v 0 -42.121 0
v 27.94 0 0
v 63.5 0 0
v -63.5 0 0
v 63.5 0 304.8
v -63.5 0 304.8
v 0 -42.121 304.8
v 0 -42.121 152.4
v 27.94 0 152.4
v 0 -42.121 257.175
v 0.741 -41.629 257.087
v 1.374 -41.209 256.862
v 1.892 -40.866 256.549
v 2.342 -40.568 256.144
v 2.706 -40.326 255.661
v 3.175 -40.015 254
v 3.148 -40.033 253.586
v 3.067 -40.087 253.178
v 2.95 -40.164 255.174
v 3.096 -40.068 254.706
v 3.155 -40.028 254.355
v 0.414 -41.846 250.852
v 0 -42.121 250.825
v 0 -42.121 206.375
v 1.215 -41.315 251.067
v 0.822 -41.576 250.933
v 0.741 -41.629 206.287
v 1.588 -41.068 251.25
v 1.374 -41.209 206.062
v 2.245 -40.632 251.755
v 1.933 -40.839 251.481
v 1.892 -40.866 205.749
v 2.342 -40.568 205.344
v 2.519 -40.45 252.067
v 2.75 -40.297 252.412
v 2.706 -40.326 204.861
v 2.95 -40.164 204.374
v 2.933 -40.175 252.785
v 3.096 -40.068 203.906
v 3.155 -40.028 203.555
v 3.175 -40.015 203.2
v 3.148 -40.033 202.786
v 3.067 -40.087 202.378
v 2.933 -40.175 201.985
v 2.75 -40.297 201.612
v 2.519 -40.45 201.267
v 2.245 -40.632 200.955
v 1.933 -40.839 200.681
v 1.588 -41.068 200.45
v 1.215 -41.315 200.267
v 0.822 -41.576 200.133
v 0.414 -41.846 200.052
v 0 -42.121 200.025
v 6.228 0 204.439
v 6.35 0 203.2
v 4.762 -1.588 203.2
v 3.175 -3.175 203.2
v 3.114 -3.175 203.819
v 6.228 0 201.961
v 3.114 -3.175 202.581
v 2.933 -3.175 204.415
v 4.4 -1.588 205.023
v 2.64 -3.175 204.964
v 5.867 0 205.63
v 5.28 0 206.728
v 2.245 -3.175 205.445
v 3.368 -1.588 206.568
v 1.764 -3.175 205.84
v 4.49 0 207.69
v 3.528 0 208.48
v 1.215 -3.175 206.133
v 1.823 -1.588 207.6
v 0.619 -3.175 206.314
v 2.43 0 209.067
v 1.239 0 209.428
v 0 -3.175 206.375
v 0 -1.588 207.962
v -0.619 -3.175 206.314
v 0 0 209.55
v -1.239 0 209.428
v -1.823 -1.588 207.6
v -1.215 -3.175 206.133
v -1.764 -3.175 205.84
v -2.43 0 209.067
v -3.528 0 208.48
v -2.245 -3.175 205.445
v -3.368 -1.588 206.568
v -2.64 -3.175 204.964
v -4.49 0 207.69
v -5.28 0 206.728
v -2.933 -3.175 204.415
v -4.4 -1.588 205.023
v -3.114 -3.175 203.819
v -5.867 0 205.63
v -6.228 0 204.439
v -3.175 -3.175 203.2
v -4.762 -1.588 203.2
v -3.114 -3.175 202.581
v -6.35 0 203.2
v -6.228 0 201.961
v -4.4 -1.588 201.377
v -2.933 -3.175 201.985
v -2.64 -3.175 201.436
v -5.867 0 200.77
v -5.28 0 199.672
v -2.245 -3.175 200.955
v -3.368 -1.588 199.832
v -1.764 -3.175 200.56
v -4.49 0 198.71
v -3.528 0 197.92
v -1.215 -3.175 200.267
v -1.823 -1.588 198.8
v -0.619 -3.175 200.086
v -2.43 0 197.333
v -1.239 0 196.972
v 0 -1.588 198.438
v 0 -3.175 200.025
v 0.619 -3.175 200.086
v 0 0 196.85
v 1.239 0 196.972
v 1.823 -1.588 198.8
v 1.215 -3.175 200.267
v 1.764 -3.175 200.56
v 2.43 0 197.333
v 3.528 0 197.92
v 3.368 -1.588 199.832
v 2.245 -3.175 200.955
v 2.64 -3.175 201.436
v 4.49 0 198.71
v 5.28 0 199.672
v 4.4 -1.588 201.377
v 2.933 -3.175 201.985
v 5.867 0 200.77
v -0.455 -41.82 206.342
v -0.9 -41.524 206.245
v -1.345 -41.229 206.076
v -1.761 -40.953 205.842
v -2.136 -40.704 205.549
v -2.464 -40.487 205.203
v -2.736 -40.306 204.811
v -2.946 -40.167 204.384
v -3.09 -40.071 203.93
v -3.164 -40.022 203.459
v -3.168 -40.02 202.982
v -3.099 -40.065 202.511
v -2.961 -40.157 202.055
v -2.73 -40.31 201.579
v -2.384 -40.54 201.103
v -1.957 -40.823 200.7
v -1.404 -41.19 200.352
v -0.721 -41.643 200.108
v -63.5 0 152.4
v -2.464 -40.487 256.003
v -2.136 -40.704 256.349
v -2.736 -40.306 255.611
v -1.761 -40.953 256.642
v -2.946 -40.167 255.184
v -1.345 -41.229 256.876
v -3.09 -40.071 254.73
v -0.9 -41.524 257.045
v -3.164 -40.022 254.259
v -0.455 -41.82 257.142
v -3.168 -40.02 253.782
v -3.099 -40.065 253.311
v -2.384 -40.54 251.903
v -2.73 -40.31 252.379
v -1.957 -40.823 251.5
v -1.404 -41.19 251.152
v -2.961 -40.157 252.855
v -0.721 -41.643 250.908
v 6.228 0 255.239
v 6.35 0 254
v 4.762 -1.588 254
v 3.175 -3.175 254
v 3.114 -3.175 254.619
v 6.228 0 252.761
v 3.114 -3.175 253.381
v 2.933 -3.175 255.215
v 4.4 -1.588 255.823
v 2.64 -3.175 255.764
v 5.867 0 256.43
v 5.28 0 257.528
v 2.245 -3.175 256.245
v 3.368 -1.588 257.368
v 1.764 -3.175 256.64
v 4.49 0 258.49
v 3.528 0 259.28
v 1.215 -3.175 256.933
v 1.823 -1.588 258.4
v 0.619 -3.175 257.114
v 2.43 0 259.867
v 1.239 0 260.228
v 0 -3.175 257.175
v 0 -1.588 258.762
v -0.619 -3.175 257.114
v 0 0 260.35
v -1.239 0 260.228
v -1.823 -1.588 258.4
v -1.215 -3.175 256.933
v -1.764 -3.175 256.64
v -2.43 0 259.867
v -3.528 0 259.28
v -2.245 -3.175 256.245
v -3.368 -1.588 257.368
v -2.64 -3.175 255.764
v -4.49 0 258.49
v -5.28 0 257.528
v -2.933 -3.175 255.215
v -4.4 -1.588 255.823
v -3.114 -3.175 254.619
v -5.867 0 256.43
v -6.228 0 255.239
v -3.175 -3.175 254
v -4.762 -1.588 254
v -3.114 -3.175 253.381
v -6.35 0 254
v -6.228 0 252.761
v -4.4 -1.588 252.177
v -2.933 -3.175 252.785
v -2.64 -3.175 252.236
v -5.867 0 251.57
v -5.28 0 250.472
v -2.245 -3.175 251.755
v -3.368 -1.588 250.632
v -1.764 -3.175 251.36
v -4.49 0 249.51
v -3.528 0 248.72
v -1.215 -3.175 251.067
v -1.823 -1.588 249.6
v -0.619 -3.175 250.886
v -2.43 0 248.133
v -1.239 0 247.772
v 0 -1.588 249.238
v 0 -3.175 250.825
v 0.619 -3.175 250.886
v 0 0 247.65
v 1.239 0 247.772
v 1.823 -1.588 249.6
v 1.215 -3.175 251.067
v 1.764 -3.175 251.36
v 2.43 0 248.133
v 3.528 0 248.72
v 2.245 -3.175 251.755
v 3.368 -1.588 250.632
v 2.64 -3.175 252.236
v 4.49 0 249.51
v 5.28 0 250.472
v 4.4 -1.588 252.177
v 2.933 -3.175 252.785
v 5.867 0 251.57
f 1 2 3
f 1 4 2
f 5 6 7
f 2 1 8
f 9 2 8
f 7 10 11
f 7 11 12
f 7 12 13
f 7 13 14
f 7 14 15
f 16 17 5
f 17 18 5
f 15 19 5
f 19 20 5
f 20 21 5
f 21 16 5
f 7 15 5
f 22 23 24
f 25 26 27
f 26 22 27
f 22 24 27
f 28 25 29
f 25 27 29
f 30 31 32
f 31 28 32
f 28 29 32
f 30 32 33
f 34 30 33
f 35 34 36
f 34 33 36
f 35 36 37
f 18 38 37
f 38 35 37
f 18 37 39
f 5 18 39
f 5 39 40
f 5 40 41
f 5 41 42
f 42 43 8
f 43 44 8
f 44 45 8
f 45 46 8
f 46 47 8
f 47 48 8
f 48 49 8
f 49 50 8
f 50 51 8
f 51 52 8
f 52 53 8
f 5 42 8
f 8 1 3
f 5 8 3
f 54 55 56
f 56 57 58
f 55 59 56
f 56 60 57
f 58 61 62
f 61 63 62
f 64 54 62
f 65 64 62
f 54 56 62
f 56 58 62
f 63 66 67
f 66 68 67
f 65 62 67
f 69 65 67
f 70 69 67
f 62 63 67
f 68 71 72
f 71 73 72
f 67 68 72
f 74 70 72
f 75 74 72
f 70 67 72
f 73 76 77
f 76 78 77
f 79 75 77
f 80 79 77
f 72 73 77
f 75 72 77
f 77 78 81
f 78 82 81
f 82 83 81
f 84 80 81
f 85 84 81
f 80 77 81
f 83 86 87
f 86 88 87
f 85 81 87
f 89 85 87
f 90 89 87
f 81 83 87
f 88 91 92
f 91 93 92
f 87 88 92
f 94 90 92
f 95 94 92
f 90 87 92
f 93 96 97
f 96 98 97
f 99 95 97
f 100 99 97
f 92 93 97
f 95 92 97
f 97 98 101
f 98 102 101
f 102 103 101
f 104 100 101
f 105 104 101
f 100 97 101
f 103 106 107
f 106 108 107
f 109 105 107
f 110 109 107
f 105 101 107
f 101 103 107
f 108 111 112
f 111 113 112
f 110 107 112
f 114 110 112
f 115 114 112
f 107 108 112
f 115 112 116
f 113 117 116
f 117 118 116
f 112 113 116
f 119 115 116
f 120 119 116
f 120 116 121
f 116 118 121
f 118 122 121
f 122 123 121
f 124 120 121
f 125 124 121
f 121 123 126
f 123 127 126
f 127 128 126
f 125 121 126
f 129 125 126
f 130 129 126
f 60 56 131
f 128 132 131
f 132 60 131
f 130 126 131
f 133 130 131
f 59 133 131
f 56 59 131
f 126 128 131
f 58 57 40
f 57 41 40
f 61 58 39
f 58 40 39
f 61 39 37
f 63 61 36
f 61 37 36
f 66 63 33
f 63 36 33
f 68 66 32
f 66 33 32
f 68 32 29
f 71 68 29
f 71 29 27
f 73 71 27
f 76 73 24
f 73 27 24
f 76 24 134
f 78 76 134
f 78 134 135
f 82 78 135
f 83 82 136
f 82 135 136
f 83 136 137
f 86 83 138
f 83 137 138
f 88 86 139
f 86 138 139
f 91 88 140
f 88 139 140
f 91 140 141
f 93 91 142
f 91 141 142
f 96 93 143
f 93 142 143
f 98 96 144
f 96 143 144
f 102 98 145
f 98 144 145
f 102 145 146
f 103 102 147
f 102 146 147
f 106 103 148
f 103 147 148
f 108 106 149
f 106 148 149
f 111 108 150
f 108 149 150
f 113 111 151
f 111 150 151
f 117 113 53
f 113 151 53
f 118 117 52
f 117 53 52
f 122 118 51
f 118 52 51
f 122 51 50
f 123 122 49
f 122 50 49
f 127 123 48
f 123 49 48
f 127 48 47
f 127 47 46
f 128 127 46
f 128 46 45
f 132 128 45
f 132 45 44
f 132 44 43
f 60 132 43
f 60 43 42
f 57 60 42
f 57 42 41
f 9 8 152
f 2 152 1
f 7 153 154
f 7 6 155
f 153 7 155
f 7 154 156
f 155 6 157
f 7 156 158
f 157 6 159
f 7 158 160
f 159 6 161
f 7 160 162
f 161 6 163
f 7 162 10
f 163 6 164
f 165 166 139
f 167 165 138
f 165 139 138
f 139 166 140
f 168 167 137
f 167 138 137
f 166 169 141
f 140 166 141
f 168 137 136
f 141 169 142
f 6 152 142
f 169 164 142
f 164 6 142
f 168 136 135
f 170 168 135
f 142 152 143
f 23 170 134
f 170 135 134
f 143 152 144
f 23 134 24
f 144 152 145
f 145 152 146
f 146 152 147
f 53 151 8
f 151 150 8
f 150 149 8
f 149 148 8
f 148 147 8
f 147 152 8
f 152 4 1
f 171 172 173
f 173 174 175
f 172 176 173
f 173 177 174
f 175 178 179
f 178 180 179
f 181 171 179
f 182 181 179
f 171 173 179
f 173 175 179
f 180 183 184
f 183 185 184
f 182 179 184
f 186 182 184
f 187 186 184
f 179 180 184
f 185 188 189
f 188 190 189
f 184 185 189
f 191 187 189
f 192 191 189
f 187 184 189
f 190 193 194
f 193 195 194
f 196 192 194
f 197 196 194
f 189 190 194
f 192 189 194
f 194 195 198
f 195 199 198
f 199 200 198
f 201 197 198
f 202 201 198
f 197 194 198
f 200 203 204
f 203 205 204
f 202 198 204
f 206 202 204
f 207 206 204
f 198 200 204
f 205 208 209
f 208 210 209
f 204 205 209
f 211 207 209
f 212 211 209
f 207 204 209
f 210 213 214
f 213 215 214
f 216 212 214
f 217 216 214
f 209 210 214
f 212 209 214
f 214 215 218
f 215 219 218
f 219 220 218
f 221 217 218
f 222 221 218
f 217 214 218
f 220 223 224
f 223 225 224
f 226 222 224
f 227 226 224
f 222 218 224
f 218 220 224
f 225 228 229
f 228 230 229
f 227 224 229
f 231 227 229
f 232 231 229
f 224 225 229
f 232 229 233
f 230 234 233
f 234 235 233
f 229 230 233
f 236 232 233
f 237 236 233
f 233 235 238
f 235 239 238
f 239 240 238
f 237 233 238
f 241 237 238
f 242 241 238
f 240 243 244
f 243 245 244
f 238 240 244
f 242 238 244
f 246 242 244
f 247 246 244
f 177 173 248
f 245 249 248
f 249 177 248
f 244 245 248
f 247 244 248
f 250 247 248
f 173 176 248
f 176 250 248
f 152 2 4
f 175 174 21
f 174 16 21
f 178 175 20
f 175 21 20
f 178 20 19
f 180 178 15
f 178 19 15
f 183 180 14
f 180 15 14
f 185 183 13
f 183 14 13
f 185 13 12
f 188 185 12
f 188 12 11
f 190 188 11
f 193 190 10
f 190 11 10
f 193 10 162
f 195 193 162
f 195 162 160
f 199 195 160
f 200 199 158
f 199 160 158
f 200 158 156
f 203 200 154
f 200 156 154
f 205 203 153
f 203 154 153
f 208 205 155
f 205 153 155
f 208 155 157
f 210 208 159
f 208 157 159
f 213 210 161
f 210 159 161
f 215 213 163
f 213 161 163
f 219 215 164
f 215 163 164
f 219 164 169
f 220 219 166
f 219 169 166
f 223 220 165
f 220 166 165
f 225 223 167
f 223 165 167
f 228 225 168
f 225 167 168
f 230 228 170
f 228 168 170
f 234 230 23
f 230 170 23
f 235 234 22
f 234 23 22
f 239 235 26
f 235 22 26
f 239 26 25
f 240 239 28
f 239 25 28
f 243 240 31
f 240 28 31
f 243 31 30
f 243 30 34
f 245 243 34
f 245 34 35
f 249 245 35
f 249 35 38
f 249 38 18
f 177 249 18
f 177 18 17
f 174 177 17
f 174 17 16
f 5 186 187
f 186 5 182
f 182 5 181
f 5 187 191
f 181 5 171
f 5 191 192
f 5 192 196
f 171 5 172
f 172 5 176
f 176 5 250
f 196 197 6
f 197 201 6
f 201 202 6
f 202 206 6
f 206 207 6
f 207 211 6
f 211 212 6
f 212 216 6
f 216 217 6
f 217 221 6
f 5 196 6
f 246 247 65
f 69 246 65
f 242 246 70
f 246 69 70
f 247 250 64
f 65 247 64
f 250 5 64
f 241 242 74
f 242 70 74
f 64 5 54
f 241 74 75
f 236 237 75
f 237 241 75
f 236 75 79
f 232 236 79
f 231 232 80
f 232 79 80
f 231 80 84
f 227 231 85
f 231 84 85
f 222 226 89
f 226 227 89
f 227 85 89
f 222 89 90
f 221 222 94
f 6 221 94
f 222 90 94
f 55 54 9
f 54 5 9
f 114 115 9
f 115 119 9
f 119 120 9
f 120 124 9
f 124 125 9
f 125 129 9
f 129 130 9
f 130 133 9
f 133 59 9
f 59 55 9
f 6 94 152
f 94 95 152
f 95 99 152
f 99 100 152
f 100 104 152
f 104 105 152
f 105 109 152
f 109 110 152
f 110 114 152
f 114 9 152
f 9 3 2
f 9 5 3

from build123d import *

# Parameters (mm, degrees)
F1_DEPTH       = 304.8
F3_DEPTH       = 50.8
F5_D           = 6.35
F5_CSINK_D     = 12.7
F5_CSINK_ANGLE = 90


with BuildPart() as f1:
    # F0 (on Top) → F1 (new body)
    with BuildSketch(Plane.XY):
        Polygon((63.5, 0), (-63.5, 0), (0, -42.1211348375), align=None)
    extrude(amount=F1_DEPTH)

    # F2 (on face) → F3 (cut)
    with BuildSketch(Plane(origin=(-19.4027777778, -29.2507880816, 0), x_dir=(0.8333333333, -0.5527707984, 0), z_dir=(-0.5527707984, -0.8333333333, 0))):
        Polygon((-52.9166666667, 152.4), (23.2833333333, 0), (23.2833333333, 152.4), align=None)
    extrude(amount=-F3_DEPTH, mode=Mode.SUBTRACT)

    # F5 (through all)
    with Locations(Plane(origin=(0, 0, 0), x_dir=(-1, 0, 0), z_dir=(0, 1, 0))):
        with Locations((0, 203.2), (0, 254)):
            CounterSinkHole(F5_D / 2, F5_CSINK_D / 2, counter_sink_angle=F5_CSINK_ANGLE)


solid = f1.part
